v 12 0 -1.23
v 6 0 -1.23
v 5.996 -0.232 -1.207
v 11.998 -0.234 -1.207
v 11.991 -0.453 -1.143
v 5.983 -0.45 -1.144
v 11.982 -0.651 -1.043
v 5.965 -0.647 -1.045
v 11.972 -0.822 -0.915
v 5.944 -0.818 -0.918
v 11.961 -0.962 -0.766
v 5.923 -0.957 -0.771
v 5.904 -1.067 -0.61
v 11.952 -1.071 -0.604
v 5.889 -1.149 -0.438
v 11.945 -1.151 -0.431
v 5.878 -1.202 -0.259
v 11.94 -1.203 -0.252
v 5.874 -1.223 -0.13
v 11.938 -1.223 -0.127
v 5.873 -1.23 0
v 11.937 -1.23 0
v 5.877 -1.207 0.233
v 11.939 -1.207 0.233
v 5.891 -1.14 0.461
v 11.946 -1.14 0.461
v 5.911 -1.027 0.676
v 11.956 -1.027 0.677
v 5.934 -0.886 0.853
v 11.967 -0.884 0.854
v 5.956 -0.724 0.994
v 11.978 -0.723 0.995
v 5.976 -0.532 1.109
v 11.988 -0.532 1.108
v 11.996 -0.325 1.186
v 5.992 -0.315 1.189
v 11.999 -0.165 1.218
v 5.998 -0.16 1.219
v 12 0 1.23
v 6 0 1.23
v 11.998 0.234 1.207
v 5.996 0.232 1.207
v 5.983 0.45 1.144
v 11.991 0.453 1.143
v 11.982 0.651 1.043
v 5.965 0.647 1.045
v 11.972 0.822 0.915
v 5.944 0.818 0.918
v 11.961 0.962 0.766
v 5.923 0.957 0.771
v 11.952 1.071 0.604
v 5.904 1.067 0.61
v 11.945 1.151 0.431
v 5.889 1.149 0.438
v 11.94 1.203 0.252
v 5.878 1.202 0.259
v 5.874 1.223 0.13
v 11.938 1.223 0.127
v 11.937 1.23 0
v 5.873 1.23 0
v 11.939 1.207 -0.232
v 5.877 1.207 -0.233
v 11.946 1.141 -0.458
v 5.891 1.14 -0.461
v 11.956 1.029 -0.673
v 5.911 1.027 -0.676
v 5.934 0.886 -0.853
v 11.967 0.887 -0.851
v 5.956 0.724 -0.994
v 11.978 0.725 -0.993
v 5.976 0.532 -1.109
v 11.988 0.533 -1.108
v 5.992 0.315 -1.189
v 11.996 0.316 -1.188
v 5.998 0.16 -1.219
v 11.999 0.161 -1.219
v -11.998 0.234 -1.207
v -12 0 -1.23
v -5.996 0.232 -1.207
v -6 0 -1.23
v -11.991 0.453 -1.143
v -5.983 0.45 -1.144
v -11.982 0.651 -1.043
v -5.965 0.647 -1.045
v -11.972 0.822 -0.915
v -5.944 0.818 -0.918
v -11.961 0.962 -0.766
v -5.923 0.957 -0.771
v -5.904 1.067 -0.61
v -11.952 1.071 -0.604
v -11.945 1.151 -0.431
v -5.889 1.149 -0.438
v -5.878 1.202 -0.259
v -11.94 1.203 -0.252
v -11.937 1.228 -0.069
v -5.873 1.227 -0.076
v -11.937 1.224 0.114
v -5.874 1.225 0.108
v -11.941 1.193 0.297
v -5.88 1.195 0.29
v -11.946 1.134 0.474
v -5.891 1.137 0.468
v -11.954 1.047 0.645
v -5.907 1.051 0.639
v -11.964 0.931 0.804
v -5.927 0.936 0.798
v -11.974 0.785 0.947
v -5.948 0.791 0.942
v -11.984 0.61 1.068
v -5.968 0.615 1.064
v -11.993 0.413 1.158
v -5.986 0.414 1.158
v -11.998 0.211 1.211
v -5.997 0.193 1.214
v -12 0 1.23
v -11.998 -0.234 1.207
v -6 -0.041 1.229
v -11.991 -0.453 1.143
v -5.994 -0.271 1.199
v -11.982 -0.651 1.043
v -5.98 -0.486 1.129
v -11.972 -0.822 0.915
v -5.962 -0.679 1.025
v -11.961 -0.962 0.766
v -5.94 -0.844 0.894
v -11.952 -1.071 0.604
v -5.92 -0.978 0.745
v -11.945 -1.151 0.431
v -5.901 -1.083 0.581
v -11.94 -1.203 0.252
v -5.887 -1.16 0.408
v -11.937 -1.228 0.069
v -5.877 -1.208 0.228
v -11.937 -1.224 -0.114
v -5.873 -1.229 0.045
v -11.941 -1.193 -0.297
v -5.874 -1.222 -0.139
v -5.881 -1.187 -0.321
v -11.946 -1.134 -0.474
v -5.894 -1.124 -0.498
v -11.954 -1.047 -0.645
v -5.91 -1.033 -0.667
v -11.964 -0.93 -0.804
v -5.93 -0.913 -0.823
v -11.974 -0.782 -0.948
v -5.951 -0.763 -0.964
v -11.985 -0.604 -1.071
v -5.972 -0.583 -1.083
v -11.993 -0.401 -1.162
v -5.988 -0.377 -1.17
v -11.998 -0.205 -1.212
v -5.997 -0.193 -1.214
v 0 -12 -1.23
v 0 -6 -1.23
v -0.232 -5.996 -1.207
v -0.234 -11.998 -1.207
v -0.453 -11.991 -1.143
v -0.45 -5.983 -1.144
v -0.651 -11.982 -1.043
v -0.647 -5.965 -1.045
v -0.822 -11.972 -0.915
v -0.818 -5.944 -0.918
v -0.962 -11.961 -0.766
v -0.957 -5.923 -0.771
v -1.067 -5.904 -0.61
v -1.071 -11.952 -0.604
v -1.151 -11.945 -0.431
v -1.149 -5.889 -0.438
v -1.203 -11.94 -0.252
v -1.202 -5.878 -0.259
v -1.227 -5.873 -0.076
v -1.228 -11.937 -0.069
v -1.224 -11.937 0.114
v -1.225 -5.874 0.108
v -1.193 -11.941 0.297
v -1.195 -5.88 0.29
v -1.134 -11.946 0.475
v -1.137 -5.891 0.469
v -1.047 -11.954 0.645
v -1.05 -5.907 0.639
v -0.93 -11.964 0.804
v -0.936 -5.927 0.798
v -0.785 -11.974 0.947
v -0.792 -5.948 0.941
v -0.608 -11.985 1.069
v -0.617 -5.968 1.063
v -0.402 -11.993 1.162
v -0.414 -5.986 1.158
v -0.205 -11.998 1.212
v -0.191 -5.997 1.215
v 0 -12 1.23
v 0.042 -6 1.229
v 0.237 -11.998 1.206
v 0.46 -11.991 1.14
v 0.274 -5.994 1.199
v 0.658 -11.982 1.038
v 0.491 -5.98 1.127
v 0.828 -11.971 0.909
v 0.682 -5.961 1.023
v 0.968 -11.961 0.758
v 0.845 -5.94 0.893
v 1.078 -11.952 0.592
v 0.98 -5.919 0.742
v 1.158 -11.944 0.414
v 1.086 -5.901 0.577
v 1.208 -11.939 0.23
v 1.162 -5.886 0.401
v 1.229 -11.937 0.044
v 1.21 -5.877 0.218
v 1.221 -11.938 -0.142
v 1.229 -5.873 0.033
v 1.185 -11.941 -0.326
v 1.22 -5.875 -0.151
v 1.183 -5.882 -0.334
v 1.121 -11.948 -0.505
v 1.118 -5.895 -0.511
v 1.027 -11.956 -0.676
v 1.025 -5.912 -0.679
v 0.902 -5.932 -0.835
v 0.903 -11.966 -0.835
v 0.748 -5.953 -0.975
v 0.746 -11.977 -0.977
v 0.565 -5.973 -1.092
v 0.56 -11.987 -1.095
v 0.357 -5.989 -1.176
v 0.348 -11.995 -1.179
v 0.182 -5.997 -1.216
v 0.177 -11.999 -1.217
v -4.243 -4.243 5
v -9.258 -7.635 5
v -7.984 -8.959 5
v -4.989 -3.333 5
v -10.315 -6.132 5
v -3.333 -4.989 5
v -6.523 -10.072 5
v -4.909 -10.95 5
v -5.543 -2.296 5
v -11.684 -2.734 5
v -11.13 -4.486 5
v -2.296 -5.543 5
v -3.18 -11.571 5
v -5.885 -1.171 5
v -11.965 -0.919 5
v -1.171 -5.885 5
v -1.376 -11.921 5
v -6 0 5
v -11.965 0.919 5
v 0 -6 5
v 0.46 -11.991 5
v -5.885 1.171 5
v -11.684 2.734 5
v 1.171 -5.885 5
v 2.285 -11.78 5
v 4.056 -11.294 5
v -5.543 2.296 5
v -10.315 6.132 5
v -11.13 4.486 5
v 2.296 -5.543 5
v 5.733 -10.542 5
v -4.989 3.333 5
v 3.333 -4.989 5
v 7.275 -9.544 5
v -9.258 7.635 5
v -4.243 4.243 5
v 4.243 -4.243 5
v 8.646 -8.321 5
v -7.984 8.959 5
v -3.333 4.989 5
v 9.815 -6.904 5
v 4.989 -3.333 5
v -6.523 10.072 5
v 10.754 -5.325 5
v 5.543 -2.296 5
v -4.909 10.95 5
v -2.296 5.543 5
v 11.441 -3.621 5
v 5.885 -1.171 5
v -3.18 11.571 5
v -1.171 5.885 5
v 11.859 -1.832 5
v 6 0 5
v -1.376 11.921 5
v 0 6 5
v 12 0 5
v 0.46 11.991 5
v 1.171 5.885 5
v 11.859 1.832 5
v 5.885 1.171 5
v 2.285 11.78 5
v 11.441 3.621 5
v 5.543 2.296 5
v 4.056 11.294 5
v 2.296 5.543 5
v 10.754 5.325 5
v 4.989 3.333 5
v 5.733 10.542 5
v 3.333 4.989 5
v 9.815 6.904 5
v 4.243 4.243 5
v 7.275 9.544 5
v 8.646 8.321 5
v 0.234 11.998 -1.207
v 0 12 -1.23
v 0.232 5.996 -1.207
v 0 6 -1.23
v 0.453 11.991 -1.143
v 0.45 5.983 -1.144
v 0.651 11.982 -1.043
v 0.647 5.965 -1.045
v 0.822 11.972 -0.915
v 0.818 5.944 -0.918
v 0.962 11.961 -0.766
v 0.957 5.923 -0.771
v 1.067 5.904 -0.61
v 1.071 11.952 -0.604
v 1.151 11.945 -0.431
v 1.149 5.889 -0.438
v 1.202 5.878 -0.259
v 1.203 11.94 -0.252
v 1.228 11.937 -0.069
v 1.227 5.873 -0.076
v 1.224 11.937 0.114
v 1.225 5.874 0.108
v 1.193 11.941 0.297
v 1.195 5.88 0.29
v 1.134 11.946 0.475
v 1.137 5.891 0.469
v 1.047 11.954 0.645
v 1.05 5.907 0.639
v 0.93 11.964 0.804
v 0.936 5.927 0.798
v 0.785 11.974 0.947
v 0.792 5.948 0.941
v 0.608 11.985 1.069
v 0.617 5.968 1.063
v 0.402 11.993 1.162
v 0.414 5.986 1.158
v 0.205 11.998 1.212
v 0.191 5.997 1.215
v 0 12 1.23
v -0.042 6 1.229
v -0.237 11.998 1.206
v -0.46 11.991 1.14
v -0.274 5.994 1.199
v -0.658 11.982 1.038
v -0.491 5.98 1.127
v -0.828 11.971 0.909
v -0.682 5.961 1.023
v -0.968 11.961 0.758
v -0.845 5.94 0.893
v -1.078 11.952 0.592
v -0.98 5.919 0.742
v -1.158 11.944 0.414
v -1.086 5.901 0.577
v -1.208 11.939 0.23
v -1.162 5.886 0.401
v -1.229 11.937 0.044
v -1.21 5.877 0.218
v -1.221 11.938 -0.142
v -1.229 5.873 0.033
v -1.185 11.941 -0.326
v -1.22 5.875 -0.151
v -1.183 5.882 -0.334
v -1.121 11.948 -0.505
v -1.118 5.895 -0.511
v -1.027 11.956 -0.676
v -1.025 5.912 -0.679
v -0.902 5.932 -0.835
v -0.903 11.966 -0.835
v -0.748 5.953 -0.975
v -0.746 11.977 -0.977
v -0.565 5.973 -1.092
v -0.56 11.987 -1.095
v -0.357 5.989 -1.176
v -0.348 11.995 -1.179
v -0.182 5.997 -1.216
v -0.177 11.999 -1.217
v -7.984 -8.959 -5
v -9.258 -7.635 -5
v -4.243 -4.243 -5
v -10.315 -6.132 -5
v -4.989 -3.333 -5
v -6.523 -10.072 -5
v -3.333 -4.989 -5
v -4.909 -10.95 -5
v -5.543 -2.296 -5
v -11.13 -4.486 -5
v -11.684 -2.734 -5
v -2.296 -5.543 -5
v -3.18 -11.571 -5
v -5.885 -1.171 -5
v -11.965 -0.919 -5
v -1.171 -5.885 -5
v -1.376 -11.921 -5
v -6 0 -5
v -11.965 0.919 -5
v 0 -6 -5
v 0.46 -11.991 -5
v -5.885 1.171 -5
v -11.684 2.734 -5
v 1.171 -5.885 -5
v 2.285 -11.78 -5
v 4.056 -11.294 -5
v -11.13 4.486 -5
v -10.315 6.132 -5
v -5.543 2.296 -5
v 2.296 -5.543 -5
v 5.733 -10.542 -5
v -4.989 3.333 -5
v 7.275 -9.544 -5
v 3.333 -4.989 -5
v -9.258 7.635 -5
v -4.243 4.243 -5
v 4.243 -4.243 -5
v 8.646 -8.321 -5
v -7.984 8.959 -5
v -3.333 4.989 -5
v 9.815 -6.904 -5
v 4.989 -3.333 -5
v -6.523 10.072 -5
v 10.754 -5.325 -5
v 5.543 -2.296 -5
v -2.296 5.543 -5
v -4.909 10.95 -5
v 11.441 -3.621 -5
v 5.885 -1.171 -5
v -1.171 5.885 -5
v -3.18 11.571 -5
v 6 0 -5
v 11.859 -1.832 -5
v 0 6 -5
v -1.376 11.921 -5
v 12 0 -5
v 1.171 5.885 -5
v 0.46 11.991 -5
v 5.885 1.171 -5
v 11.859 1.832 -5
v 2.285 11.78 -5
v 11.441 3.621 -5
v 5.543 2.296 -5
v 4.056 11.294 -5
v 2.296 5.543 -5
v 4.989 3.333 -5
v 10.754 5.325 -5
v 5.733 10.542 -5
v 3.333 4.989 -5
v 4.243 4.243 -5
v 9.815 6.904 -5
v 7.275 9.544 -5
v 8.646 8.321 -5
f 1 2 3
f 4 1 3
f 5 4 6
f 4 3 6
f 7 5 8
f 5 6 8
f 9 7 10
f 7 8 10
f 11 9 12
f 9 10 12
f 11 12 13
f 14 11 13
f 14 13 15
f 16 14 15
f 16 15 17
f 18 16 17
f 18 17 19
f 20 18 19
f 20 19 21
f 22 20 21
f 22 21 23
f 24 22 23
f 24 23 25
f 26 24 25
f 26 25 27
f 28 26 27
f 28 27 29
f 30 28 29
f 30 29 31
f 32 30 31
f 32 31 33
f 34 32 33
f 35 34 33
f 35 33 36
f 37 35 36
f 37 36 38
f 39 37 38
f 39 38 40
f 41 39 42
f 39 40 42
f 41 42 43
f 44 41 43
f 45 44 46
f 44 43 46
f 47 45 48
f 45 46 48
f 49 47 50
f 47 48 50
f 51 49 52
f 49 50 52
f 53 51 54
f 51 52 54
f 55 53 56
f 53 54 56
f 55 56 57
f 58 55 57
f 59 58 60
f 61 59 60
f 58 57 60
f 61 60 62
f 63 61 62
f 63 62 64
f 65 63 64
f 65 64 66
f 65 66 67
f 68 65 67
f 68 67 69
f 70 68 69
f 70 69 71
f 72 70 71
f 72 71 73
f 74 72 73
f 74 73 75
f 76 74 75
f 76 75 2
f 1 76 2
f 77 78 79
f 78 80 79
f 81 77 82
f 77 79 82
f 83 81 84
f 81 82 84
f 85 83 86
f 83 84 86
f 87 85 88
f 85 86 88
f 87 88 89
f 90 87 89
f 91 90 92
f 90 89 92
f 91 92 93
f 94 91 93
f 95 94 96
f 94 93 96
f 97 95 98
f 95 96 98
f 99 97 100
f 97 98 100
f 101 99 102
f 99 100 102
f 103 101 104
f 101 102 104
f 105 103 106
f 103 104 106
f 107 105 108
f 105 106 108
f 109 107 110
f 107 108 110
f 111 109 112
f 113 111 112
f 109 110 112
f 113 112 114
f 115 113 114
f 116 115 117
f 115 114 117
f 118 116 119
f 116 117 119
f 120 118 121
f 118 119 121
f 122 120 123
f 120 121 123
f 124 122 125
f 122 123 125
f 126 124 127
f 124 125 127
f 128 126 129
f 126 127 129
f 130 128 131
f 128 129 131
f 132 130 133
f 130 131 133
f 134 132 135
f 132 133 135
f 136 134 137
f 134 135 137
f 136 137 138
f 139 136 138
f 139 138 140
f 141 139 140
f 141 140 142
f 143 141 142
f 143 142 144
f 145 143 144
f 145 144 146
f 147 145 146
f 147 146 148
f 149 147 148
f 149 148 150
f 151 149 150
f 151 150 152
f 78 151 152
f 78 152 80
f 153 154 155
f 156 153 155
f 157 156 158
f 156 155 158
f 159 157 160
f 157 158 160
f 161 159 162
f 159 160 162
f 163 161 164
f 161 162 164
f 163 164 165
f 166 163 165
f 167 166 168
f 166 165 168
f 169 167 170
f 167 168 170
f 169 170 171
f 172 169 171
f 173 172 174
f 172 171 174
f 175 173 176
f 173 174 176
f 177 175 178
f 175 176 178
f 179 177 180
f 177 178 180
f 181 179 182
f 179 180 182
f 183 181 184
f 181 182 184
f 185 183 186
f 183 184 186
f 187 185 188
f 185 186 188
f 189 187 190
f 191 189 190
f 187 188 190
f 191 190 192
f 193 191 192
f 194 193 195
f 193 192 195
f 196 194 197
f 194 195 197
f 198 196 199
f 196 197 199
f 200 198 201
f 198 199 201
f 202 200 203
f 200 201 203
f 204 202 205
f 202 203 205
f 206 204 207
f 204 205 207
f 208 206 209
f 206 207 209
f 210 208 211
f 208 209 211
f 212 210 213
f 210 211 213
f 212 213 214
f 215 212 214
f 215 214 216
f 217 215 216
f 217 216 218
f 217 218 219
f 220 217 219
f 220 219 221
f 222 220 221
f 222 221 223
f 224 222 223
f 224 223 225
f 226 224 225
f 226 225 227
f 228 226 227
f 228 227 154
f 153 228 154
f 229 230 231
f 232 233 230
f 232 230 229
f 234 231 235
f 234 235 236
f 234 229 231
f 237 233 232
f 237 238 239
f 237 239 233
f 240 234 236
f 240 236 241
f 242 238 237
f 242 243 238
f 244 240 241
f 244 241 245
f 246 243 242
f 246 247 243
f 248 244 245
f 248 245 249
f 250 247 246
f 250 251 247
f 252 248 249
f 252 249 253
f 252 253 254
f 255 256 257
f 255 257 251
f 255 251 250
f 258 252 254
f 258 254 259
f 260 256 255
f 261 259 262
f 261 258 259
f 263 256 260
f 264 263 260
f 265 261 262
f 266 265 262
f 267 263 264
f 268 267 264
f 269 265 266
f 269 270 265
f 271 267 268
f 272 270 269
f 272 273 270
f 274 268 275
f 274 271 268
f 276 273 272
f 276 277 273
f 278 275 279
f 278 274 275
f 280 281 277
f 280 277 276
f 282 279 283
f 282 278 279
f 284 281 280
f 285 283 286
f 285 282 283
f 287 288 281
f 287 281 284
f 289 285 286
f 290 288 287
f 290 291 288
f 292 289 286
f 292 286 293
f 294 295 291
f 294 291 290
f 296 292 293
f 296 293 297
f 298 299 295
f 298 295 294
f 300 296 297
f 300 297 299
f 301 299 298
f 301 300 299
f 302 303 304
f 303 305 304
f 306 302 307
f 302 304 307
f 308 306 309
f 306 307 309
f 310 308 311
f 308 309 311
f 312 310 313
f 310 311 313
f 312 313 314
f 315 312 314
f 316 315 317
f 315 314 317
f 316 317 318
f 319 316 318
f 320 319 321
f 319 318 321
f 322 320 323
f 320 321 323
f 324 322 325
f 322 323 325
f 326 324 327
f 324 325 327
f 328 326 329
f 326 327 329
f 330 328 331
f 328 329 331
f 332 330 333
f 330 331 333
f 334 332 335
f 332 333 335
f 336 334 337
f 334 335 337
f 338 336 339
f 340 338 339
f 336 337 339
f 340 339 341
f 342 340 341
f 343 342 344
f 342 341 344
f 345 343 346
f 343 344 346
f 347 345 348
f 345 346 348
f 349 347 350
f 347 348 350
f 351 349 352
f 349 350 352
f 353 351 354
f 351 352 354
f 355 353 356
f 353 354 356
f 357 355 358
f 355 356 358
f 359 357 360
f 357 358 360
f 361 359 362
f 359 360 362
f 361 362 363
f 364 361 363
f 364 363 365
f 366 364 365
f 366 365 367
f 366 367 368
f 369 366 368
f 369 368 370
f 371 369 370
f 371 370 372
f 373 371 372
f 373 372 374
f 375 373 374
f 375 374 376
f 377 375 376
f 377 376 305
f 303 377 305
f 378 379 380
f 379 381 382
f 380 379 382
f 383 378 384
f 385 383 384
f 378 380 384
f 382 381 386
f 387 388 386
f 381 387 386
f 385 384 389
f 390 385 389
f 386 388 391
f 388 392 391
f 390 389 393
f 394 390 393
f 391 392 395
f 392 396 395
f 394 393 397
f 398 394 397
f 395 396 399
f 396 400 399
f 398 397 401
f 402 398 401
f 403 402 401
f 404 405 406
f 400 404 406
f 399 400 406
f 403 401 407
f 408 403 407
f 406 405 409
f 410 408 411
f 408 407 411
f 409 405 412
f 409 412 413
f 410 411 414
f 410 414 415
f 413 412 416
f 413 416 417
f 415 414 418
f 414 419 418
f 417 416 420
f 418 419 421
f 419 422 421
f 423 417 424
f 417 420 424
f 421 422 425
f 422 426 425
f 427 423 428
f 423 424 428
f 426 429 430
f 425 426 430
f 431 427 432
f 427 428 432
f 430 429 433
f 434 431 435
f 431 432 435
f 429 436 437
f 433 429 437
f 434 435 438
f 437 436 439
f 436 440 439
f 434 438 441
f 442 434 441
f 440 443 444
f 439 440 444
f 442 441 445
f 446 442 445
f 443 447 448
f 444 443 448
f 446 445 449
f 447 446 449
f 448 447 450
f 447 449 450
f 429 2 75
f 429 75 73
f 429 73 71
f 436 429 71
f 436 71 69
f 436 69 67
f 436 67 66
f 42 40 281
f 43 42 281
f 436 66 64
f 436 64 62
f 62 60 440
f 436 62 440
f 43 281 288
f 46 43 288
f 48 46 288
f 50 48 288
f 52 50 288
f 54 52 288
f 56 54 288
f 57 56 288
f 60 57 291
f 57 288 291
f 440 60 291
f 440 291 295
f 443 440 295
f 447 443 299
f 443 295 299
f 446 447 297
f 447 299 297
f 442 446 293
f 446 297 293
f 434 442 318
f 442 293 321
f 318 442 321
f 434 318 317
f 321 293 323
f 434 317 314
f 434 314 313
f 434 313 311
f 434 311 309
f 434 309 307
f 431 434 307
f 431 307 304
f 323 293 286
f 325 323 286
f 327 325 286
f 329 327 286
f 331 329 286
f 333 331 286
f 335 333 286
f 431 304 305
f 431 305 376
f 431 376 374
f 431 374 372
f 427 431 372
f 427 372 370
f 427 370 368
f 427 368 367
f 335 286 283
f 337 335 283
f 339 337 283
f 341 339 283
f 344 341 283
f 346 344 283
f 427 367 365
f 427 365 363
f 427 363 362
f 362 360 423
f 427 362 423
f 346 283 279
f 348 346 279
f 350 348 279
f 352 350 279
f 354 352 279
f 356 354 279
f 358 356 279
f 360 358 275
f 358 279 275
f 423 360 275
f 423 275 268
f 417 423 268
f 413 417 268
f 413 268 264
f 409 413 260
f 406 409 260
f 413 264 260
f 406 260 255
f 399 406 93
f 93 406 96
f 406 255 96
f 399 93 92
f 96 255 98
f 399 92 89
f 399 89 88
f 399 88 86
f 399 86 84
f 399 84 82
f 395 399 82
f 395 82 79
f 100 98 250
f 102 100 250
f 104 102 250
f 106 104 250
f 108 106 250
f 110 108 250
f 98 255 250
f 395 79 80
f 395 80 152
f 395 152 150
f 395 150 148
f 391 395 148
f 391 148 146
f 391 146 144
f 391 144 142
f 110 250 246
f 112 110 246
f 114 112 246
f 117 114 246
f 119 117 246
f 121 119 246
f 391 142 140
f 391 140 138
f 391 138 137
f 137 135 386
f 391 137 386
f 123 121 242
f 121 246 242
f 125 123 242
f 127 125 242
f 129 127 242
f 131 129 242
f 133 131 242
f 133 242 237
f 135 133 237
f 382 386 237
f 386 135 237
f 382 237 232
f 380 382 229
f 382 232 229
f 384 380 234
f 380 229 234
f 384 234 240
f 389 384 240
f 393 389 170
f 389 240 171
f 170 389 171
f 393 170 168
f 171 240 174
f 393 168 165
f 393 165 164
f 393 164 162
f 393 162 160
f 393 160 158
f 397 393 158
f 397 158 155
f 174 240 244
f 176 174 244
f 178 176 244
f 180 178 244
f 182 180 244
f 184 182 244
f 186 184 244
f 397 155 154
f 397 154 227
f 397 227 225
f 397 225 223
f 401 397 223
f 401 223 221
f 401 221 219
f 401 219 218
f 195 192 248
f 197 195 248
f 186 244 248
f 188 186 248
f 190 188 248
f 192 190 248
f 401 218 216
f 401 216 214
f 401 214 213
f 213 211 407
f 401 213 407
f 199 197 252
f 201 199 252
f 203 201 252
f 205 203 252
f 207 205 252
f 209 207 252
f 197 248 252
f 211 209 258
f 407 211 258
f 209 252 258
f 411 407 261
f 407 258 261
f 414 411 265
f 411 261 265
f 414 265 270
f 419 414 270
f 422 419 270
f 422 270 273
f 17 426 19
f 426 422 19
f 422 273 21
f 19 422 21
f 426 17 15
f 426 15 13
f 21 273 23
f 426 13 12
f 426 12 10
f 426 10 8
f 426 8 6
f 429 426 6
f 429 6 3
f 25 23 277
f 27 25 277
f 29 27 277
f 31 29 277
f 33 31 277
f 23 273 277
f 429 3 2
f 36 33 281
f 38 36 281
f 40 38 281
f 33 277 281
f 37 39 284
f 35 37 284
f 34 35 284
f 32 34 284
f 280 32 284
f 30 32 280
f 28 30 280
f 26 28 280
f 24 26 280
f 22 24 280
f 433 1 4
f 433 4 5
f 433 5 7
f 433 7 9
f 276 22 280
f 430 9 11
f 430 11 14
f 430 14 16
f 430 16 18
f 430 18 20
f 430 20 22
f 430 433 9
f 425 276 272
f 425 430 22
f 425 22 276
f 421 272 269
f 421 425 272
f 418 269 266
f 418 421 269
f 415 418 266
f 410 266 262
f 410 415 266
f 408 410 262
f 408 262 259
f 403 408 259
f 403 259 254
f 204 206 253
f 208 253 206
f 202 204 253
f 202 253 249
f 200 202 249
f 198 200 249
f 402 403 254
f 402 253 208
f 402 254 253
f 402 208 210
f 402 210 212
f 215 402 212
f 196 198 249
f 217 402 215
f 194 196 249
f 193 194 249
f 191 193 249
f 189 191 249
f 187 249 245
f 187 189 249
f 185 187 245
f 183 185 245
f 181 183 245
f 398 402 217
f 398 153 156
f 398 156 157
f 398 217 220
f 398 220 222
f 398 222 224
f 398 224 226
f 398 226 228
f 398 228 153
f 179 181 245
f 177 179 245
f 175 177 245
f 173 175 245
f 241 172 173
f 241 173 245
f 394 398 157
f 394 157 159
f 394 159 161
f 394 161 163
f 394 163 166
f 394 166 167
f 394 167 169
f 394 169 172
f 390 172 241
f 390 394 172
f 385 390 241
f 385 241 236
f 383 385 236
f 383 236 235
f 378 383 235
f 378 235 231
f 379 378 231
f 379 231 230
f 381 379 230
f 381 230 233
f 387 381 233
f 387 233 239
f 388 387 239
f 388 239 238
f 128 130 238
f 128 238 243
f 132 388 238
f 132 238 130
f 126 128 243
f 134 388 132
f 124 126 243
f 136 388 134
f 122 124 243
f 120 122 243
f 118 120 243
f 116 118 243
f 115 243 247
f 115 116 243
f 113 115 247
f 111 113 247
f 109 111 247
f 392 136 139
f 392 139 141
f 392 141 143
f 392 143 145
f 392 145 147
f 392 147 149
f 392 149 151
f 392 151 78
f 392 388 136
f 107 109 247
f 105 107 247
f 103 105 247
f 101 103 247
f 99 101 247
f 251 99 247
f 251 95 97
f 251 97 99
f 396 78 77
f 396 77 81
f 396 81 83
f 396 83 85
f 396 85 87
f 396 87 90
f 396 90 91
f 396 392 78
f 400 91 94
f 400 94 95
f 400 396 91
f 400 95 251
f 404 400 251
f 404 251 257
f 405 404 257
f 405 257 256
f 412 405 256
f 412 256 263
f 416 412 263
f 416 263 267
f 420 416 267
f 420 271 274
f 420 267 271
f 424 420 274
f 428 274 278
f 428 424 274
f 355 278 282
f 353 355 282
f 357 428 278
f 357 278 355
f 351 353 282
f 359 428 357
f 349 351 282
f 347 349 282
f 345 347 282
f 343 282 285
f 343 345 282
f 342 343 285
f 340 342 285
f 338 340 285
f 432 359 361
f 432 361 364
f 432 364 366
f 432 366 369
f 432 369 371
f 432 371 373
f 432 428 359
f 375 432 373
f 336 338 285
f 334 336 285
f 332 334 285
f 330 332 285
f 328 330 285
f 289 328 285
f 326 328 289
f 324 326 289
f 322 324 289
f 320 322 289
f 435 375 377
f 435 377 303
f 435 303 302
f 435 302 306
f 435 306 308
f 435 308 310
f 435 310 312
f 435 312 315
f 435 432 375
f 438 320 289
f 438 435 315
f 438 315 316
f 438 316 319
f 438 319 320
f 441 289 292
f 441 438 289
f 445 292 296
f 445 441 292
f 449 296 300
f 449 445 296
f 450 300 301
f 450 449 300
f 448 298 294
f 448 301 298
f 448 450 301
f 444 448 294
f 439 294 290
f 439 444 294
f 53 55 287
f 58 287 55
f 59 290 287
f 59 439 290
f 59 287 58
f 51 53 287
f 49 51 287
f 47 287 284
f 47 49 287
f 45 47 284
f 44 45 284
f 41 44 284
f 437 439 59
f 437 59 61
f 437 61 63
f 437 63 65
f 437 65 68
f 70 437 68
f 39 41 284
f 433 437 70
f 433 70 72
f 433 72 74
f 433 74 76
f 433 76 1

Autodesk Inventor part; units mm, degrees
ref_plane "XZ Plane" through (0, 0, 0) normal (0, 1, 0) x (-1, 0, 0)
ref_plane "XY Plane" through (0, 0, 0) normal (0, 0, 1) x (1, 0, 0)
sketch "Sketch1" plane through (0, 0, 0) normal (0, 0, 1) x (1, 0, 0)
  circle A0 centre (0, 0) radius 12
  circle A1 centre (0, 0) radius 6
  dimension "d0" = 24
  dimension "d1" = 12
extrude "Extrusion1" add sketch "Sketch1" along normal mid plane 10
thread "Thread1" size "M12x1.75" class "6H" standard "ISO Metric profile" length 10
ref_plane "Work Plane1" through (12, 0, 0) normal (1, 0, 0) x (0, 1, 0)
sketch "Sketch2" plane through (12, 0, 0) normal (1, 0, 0) x (0, 1, 0)
  point P0 (0, 0)
  point P1 (0, 0)
hole "Hole1" at (12, 0, 0) direction (-1, 0, 0) diameter 2.459 depth 6.5 thread size "M3x0.5" class "6H" standard "ISO Metric profile"
pattern_circular "Circular Pattern1" count 4 over 360 about axis through (0, 0, 0) along (0, 0, 1) of "Hole1"
properties part number "36" material "Copper"
